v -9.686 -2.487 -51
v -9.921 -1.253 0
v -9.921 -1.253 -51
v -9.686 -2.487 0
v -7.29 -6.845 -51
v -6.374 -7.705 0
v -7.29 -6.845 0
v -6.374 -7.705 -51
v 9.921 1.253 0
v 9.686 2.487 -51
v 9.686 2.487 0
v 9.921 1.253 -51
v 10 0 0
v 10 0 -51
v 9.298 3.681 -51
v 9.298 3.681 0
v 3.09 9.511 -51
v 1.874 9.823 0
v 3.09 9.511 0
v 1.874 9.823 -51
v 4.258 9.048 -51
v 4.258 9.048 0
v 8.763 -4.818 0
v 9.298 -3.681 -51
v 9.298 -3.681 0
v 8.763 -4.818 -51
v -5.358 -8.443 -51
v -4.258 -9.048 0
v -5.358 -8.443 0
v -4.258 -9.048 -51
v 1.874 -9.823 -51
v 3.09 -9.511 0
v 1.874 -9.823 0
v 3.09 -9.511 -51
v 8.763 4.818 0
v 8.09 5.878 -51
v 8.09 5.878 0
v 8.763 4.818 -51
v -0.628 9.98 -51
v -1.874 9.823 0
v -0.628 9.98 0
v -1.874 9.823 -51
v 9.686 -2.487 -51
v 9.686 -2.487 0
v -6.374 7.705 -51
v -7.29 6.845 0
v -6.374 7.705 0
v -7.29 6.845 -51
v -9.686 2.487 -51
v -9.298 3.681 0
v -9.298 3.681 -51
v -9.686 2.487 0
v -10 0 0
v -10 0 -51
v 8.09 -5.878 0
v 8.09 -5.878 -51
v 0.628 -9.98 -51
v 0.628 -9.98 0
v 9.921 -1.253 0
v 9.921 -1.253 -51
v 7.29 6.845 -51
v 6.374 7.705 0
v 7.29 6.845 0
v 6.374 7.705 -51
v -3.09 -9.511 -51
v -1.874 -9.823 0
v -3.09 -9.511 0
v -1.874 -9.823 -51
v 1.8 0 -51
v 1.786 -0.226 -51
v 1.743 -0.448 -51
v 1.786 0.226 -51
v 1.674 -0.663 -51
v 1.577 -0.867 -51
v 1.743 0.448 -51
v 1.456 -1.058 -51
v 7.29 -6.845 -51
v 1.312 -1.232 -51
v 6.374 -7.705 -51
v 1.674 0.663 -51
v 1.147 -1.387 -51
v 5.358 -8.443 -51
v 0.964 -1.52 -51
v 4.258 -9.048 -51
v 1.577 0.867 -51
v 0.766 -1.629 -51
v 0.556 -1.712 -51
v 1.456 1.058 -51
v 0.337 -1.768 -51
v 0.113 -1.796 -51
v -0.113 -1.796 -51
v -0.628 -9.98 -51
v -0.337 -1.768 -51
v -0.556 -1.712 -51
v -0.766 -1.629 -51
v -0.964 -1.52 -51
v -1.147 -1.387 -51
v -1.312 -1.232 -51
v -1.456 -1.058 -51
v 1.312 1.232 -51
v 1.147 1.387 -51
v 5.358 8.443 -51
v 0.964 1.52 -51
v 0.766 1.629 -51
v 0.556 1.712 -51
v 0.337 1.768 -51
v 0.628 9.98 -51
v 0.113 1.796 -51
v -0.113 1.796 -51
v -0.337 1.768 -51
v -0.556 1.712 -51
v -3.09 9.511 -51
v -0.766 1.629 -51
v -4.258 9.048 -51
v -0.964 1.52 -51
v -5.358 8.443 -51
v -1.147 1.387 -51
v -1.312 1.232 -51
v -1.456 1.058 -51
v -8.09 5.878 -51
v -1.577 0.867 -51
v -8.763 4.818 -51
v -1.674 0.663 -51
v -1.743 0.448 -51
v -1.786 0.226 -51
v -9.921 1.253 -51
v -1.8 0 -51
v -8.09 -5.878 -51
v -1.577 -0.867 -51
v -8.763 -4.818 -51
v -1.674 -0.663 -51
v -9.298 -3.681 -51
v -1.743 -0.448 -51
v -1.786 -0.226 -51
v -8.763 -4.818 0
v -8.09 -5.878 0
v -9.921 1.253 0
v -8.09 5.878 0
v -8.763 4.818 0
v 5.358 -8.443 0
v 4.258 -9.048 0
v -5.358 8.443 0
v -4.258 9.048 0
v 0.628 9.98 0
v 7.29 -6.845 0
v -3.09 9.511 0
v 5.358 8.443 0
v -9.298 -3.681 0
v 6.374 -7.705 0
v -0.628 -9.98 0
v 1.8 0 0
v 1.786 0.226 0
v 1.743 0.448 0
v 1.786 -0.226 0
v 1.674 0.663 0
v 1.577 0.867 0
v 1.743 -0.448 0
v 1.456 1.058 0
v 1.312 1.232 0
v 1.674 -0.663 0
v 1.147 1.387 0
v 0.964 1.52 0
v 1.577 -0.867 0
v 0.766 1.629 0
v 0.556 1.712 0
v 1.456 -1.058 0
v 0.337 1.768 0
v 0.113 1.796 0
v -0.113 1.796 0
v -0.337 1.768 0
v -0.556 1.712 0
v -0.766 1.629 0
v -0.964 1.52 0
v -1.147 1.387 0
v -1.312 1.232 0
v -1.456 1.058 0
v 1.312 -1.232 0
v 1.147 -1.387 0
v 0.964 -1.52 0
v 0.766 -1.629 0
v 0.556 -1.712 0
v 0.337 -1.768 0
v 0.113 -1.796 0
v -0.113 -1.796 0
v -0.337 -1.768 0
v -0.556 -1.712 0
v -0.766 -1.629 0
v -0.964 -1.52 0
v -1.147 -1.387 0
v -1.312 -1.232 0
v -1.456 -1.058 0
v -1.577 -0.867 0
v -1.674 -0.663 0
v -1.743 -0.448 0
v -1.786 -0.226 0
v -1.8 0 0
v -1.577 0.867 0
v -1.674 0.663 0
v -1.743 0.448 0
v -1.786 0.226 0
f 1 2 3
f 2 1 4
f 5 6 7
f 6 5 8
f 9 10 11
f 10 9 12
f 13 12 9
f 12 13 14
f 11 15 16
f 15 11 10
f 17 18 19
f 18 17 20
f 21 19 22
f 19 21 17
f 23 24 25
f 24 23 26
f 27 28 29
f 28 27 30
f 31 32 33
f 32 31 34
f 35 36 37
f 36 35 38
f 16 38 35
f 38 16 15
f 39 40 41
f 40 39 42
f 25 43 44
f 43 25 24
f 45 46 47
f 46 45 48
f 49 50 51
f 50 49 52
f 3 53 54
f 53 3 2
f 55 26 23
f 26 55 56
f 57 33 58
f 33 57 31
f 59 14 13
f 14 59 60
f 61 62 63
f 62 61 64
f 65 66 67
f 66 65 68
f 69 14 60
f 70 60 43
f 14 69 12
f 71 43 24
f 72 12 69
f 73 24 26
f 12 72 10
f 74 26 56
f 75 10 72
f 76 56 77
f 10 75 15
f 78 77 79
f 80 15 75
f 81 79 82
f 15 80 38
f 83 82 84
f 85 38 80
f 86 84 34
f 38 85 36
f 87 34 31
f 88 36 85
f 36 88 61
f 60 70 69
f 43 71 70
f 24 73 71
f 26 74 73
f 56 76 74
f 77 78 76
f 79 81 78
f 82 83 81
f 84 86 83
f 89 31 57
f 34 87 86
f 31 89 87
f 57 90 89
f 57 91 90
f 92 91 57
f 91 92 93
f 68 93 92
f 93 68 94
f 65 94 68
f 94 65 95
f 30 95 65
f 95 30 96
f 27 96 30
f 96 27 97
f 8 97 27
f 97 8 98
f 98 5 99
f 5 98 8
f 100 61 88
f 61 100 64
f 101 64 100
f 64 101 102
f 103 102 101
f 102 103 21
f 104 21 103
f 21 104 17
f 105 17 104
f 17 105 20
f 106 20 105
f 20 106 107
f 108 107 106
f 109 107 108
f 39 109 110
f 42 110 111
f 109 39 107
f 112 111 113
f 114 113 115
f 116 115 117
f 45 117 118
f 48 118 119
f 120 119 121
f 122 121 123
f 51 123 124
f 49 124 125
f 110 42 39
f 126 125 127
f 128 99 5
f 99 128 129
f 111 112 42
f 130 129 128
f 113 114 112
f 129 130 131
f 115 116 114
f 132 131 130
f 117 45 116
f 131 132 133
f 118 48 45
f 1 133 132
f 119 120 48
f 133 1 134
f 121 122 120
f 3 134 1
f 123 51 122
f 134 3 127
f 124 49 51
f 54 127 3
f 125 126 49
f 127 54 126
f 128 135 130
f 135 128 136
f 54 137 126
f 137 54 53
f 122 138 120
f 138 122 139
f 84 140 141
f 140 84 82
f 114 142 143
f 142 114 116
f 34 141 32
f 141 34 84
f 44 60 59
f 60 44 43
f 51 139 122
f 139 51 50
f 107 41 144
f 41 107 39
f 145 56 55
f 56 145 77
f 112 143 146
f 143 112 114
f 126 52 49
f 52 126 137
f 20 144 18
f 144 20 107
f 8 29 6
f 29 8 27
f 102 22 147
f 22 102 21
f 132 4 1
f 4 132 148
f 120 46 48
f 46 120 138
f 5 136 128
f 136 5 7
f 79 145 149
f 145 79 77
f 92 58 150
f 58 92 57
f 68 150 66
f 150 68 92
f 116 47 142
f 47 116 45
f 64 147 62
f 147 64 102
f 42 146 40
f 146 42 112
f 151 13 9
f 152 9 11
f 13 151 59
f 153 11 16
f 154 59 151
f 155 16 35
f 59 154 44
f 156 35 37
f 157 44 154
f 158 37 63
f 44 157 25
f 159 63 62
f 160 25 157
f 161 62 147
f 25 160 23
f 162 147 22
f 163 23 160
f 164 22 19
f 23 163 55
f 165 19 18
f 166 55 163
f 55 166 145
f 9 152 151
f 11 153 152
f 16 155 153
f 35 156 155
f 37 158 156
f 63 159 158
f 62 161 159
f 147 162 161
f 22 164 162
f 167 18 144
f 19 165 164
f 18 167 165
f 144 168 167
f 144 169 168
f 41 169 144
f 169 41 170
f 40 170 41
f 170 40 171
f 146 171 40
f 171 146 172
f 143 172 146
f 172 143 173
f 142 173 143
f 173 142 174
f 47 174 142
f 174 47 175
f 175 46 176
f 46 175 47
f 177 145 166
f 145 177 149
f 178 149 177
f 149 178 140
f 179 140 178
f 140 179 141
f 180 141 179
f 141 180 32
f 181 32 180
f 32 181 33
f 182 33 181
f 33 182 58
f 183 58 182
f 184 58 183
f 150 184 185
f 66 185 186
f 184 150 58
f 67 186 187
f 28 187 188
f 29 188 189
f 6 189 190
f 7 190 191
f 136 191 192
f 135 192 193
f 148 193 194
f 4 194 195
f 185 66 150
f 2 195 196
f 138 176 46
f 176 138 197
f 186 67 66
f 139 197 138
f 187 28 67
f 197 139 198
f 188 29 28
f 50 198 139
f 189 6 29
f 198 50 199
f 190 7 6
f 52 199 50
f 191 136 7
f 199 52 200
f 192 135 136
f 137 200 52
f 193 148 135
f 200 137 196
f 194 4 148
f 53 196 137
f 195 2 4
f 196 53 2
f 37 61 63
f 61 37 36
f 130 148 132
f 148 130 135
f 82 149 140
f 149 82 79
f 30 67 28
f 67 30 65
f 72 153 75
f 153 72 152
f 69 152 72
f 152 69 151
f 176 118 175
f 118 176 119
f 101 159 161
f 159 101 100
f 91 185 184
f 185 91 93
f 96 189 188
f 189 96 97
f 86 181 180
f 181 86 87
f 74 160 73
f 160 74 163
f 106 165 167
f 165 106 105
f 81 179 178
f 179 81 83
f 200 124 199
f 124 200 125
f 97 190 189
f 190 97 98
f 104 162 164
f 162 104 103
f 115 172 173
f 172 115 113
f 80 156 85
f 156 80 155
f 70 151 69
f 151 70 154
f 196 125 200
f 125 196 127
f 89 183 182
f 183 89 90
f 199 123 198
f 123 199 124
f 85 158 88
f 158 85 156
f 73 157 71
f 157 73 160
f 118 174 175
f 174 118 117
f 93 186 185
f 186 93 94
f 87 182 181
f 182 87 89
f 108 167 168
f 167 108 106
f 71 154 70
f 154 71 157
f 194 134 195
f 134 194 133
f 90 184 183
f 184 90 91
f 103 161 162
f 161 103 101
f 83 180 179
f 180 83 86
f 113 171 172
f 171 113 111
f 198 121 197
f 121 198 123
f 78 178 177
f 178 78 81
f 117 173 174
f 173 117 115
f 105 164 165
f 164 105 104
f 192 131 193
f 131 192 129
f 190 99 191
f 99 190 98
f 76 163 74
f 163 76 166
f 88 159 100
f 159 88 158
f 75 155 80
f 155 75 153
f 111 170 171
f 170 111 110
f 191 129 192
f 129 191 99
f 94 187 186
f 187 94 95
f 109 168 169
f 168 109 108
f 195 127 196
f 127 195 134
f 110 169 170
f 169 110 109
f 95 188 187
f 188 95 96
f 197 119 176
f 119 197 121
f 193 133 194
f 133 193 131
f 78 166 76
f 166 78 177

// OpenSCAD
$fn = 50;


difference() {
	union() {
		translate(v = [0, 0, -51.0000000000]) {
			cylinder(h = 51, r = 10.0000000000);
		}
		cylinder(h = 0, r = 16.0000000000);
	}
	union() {
		#translate(v = [0, 0, -51]) {
			cylinder(h = 51, r = 1.8000000000);
		}
	}
}
